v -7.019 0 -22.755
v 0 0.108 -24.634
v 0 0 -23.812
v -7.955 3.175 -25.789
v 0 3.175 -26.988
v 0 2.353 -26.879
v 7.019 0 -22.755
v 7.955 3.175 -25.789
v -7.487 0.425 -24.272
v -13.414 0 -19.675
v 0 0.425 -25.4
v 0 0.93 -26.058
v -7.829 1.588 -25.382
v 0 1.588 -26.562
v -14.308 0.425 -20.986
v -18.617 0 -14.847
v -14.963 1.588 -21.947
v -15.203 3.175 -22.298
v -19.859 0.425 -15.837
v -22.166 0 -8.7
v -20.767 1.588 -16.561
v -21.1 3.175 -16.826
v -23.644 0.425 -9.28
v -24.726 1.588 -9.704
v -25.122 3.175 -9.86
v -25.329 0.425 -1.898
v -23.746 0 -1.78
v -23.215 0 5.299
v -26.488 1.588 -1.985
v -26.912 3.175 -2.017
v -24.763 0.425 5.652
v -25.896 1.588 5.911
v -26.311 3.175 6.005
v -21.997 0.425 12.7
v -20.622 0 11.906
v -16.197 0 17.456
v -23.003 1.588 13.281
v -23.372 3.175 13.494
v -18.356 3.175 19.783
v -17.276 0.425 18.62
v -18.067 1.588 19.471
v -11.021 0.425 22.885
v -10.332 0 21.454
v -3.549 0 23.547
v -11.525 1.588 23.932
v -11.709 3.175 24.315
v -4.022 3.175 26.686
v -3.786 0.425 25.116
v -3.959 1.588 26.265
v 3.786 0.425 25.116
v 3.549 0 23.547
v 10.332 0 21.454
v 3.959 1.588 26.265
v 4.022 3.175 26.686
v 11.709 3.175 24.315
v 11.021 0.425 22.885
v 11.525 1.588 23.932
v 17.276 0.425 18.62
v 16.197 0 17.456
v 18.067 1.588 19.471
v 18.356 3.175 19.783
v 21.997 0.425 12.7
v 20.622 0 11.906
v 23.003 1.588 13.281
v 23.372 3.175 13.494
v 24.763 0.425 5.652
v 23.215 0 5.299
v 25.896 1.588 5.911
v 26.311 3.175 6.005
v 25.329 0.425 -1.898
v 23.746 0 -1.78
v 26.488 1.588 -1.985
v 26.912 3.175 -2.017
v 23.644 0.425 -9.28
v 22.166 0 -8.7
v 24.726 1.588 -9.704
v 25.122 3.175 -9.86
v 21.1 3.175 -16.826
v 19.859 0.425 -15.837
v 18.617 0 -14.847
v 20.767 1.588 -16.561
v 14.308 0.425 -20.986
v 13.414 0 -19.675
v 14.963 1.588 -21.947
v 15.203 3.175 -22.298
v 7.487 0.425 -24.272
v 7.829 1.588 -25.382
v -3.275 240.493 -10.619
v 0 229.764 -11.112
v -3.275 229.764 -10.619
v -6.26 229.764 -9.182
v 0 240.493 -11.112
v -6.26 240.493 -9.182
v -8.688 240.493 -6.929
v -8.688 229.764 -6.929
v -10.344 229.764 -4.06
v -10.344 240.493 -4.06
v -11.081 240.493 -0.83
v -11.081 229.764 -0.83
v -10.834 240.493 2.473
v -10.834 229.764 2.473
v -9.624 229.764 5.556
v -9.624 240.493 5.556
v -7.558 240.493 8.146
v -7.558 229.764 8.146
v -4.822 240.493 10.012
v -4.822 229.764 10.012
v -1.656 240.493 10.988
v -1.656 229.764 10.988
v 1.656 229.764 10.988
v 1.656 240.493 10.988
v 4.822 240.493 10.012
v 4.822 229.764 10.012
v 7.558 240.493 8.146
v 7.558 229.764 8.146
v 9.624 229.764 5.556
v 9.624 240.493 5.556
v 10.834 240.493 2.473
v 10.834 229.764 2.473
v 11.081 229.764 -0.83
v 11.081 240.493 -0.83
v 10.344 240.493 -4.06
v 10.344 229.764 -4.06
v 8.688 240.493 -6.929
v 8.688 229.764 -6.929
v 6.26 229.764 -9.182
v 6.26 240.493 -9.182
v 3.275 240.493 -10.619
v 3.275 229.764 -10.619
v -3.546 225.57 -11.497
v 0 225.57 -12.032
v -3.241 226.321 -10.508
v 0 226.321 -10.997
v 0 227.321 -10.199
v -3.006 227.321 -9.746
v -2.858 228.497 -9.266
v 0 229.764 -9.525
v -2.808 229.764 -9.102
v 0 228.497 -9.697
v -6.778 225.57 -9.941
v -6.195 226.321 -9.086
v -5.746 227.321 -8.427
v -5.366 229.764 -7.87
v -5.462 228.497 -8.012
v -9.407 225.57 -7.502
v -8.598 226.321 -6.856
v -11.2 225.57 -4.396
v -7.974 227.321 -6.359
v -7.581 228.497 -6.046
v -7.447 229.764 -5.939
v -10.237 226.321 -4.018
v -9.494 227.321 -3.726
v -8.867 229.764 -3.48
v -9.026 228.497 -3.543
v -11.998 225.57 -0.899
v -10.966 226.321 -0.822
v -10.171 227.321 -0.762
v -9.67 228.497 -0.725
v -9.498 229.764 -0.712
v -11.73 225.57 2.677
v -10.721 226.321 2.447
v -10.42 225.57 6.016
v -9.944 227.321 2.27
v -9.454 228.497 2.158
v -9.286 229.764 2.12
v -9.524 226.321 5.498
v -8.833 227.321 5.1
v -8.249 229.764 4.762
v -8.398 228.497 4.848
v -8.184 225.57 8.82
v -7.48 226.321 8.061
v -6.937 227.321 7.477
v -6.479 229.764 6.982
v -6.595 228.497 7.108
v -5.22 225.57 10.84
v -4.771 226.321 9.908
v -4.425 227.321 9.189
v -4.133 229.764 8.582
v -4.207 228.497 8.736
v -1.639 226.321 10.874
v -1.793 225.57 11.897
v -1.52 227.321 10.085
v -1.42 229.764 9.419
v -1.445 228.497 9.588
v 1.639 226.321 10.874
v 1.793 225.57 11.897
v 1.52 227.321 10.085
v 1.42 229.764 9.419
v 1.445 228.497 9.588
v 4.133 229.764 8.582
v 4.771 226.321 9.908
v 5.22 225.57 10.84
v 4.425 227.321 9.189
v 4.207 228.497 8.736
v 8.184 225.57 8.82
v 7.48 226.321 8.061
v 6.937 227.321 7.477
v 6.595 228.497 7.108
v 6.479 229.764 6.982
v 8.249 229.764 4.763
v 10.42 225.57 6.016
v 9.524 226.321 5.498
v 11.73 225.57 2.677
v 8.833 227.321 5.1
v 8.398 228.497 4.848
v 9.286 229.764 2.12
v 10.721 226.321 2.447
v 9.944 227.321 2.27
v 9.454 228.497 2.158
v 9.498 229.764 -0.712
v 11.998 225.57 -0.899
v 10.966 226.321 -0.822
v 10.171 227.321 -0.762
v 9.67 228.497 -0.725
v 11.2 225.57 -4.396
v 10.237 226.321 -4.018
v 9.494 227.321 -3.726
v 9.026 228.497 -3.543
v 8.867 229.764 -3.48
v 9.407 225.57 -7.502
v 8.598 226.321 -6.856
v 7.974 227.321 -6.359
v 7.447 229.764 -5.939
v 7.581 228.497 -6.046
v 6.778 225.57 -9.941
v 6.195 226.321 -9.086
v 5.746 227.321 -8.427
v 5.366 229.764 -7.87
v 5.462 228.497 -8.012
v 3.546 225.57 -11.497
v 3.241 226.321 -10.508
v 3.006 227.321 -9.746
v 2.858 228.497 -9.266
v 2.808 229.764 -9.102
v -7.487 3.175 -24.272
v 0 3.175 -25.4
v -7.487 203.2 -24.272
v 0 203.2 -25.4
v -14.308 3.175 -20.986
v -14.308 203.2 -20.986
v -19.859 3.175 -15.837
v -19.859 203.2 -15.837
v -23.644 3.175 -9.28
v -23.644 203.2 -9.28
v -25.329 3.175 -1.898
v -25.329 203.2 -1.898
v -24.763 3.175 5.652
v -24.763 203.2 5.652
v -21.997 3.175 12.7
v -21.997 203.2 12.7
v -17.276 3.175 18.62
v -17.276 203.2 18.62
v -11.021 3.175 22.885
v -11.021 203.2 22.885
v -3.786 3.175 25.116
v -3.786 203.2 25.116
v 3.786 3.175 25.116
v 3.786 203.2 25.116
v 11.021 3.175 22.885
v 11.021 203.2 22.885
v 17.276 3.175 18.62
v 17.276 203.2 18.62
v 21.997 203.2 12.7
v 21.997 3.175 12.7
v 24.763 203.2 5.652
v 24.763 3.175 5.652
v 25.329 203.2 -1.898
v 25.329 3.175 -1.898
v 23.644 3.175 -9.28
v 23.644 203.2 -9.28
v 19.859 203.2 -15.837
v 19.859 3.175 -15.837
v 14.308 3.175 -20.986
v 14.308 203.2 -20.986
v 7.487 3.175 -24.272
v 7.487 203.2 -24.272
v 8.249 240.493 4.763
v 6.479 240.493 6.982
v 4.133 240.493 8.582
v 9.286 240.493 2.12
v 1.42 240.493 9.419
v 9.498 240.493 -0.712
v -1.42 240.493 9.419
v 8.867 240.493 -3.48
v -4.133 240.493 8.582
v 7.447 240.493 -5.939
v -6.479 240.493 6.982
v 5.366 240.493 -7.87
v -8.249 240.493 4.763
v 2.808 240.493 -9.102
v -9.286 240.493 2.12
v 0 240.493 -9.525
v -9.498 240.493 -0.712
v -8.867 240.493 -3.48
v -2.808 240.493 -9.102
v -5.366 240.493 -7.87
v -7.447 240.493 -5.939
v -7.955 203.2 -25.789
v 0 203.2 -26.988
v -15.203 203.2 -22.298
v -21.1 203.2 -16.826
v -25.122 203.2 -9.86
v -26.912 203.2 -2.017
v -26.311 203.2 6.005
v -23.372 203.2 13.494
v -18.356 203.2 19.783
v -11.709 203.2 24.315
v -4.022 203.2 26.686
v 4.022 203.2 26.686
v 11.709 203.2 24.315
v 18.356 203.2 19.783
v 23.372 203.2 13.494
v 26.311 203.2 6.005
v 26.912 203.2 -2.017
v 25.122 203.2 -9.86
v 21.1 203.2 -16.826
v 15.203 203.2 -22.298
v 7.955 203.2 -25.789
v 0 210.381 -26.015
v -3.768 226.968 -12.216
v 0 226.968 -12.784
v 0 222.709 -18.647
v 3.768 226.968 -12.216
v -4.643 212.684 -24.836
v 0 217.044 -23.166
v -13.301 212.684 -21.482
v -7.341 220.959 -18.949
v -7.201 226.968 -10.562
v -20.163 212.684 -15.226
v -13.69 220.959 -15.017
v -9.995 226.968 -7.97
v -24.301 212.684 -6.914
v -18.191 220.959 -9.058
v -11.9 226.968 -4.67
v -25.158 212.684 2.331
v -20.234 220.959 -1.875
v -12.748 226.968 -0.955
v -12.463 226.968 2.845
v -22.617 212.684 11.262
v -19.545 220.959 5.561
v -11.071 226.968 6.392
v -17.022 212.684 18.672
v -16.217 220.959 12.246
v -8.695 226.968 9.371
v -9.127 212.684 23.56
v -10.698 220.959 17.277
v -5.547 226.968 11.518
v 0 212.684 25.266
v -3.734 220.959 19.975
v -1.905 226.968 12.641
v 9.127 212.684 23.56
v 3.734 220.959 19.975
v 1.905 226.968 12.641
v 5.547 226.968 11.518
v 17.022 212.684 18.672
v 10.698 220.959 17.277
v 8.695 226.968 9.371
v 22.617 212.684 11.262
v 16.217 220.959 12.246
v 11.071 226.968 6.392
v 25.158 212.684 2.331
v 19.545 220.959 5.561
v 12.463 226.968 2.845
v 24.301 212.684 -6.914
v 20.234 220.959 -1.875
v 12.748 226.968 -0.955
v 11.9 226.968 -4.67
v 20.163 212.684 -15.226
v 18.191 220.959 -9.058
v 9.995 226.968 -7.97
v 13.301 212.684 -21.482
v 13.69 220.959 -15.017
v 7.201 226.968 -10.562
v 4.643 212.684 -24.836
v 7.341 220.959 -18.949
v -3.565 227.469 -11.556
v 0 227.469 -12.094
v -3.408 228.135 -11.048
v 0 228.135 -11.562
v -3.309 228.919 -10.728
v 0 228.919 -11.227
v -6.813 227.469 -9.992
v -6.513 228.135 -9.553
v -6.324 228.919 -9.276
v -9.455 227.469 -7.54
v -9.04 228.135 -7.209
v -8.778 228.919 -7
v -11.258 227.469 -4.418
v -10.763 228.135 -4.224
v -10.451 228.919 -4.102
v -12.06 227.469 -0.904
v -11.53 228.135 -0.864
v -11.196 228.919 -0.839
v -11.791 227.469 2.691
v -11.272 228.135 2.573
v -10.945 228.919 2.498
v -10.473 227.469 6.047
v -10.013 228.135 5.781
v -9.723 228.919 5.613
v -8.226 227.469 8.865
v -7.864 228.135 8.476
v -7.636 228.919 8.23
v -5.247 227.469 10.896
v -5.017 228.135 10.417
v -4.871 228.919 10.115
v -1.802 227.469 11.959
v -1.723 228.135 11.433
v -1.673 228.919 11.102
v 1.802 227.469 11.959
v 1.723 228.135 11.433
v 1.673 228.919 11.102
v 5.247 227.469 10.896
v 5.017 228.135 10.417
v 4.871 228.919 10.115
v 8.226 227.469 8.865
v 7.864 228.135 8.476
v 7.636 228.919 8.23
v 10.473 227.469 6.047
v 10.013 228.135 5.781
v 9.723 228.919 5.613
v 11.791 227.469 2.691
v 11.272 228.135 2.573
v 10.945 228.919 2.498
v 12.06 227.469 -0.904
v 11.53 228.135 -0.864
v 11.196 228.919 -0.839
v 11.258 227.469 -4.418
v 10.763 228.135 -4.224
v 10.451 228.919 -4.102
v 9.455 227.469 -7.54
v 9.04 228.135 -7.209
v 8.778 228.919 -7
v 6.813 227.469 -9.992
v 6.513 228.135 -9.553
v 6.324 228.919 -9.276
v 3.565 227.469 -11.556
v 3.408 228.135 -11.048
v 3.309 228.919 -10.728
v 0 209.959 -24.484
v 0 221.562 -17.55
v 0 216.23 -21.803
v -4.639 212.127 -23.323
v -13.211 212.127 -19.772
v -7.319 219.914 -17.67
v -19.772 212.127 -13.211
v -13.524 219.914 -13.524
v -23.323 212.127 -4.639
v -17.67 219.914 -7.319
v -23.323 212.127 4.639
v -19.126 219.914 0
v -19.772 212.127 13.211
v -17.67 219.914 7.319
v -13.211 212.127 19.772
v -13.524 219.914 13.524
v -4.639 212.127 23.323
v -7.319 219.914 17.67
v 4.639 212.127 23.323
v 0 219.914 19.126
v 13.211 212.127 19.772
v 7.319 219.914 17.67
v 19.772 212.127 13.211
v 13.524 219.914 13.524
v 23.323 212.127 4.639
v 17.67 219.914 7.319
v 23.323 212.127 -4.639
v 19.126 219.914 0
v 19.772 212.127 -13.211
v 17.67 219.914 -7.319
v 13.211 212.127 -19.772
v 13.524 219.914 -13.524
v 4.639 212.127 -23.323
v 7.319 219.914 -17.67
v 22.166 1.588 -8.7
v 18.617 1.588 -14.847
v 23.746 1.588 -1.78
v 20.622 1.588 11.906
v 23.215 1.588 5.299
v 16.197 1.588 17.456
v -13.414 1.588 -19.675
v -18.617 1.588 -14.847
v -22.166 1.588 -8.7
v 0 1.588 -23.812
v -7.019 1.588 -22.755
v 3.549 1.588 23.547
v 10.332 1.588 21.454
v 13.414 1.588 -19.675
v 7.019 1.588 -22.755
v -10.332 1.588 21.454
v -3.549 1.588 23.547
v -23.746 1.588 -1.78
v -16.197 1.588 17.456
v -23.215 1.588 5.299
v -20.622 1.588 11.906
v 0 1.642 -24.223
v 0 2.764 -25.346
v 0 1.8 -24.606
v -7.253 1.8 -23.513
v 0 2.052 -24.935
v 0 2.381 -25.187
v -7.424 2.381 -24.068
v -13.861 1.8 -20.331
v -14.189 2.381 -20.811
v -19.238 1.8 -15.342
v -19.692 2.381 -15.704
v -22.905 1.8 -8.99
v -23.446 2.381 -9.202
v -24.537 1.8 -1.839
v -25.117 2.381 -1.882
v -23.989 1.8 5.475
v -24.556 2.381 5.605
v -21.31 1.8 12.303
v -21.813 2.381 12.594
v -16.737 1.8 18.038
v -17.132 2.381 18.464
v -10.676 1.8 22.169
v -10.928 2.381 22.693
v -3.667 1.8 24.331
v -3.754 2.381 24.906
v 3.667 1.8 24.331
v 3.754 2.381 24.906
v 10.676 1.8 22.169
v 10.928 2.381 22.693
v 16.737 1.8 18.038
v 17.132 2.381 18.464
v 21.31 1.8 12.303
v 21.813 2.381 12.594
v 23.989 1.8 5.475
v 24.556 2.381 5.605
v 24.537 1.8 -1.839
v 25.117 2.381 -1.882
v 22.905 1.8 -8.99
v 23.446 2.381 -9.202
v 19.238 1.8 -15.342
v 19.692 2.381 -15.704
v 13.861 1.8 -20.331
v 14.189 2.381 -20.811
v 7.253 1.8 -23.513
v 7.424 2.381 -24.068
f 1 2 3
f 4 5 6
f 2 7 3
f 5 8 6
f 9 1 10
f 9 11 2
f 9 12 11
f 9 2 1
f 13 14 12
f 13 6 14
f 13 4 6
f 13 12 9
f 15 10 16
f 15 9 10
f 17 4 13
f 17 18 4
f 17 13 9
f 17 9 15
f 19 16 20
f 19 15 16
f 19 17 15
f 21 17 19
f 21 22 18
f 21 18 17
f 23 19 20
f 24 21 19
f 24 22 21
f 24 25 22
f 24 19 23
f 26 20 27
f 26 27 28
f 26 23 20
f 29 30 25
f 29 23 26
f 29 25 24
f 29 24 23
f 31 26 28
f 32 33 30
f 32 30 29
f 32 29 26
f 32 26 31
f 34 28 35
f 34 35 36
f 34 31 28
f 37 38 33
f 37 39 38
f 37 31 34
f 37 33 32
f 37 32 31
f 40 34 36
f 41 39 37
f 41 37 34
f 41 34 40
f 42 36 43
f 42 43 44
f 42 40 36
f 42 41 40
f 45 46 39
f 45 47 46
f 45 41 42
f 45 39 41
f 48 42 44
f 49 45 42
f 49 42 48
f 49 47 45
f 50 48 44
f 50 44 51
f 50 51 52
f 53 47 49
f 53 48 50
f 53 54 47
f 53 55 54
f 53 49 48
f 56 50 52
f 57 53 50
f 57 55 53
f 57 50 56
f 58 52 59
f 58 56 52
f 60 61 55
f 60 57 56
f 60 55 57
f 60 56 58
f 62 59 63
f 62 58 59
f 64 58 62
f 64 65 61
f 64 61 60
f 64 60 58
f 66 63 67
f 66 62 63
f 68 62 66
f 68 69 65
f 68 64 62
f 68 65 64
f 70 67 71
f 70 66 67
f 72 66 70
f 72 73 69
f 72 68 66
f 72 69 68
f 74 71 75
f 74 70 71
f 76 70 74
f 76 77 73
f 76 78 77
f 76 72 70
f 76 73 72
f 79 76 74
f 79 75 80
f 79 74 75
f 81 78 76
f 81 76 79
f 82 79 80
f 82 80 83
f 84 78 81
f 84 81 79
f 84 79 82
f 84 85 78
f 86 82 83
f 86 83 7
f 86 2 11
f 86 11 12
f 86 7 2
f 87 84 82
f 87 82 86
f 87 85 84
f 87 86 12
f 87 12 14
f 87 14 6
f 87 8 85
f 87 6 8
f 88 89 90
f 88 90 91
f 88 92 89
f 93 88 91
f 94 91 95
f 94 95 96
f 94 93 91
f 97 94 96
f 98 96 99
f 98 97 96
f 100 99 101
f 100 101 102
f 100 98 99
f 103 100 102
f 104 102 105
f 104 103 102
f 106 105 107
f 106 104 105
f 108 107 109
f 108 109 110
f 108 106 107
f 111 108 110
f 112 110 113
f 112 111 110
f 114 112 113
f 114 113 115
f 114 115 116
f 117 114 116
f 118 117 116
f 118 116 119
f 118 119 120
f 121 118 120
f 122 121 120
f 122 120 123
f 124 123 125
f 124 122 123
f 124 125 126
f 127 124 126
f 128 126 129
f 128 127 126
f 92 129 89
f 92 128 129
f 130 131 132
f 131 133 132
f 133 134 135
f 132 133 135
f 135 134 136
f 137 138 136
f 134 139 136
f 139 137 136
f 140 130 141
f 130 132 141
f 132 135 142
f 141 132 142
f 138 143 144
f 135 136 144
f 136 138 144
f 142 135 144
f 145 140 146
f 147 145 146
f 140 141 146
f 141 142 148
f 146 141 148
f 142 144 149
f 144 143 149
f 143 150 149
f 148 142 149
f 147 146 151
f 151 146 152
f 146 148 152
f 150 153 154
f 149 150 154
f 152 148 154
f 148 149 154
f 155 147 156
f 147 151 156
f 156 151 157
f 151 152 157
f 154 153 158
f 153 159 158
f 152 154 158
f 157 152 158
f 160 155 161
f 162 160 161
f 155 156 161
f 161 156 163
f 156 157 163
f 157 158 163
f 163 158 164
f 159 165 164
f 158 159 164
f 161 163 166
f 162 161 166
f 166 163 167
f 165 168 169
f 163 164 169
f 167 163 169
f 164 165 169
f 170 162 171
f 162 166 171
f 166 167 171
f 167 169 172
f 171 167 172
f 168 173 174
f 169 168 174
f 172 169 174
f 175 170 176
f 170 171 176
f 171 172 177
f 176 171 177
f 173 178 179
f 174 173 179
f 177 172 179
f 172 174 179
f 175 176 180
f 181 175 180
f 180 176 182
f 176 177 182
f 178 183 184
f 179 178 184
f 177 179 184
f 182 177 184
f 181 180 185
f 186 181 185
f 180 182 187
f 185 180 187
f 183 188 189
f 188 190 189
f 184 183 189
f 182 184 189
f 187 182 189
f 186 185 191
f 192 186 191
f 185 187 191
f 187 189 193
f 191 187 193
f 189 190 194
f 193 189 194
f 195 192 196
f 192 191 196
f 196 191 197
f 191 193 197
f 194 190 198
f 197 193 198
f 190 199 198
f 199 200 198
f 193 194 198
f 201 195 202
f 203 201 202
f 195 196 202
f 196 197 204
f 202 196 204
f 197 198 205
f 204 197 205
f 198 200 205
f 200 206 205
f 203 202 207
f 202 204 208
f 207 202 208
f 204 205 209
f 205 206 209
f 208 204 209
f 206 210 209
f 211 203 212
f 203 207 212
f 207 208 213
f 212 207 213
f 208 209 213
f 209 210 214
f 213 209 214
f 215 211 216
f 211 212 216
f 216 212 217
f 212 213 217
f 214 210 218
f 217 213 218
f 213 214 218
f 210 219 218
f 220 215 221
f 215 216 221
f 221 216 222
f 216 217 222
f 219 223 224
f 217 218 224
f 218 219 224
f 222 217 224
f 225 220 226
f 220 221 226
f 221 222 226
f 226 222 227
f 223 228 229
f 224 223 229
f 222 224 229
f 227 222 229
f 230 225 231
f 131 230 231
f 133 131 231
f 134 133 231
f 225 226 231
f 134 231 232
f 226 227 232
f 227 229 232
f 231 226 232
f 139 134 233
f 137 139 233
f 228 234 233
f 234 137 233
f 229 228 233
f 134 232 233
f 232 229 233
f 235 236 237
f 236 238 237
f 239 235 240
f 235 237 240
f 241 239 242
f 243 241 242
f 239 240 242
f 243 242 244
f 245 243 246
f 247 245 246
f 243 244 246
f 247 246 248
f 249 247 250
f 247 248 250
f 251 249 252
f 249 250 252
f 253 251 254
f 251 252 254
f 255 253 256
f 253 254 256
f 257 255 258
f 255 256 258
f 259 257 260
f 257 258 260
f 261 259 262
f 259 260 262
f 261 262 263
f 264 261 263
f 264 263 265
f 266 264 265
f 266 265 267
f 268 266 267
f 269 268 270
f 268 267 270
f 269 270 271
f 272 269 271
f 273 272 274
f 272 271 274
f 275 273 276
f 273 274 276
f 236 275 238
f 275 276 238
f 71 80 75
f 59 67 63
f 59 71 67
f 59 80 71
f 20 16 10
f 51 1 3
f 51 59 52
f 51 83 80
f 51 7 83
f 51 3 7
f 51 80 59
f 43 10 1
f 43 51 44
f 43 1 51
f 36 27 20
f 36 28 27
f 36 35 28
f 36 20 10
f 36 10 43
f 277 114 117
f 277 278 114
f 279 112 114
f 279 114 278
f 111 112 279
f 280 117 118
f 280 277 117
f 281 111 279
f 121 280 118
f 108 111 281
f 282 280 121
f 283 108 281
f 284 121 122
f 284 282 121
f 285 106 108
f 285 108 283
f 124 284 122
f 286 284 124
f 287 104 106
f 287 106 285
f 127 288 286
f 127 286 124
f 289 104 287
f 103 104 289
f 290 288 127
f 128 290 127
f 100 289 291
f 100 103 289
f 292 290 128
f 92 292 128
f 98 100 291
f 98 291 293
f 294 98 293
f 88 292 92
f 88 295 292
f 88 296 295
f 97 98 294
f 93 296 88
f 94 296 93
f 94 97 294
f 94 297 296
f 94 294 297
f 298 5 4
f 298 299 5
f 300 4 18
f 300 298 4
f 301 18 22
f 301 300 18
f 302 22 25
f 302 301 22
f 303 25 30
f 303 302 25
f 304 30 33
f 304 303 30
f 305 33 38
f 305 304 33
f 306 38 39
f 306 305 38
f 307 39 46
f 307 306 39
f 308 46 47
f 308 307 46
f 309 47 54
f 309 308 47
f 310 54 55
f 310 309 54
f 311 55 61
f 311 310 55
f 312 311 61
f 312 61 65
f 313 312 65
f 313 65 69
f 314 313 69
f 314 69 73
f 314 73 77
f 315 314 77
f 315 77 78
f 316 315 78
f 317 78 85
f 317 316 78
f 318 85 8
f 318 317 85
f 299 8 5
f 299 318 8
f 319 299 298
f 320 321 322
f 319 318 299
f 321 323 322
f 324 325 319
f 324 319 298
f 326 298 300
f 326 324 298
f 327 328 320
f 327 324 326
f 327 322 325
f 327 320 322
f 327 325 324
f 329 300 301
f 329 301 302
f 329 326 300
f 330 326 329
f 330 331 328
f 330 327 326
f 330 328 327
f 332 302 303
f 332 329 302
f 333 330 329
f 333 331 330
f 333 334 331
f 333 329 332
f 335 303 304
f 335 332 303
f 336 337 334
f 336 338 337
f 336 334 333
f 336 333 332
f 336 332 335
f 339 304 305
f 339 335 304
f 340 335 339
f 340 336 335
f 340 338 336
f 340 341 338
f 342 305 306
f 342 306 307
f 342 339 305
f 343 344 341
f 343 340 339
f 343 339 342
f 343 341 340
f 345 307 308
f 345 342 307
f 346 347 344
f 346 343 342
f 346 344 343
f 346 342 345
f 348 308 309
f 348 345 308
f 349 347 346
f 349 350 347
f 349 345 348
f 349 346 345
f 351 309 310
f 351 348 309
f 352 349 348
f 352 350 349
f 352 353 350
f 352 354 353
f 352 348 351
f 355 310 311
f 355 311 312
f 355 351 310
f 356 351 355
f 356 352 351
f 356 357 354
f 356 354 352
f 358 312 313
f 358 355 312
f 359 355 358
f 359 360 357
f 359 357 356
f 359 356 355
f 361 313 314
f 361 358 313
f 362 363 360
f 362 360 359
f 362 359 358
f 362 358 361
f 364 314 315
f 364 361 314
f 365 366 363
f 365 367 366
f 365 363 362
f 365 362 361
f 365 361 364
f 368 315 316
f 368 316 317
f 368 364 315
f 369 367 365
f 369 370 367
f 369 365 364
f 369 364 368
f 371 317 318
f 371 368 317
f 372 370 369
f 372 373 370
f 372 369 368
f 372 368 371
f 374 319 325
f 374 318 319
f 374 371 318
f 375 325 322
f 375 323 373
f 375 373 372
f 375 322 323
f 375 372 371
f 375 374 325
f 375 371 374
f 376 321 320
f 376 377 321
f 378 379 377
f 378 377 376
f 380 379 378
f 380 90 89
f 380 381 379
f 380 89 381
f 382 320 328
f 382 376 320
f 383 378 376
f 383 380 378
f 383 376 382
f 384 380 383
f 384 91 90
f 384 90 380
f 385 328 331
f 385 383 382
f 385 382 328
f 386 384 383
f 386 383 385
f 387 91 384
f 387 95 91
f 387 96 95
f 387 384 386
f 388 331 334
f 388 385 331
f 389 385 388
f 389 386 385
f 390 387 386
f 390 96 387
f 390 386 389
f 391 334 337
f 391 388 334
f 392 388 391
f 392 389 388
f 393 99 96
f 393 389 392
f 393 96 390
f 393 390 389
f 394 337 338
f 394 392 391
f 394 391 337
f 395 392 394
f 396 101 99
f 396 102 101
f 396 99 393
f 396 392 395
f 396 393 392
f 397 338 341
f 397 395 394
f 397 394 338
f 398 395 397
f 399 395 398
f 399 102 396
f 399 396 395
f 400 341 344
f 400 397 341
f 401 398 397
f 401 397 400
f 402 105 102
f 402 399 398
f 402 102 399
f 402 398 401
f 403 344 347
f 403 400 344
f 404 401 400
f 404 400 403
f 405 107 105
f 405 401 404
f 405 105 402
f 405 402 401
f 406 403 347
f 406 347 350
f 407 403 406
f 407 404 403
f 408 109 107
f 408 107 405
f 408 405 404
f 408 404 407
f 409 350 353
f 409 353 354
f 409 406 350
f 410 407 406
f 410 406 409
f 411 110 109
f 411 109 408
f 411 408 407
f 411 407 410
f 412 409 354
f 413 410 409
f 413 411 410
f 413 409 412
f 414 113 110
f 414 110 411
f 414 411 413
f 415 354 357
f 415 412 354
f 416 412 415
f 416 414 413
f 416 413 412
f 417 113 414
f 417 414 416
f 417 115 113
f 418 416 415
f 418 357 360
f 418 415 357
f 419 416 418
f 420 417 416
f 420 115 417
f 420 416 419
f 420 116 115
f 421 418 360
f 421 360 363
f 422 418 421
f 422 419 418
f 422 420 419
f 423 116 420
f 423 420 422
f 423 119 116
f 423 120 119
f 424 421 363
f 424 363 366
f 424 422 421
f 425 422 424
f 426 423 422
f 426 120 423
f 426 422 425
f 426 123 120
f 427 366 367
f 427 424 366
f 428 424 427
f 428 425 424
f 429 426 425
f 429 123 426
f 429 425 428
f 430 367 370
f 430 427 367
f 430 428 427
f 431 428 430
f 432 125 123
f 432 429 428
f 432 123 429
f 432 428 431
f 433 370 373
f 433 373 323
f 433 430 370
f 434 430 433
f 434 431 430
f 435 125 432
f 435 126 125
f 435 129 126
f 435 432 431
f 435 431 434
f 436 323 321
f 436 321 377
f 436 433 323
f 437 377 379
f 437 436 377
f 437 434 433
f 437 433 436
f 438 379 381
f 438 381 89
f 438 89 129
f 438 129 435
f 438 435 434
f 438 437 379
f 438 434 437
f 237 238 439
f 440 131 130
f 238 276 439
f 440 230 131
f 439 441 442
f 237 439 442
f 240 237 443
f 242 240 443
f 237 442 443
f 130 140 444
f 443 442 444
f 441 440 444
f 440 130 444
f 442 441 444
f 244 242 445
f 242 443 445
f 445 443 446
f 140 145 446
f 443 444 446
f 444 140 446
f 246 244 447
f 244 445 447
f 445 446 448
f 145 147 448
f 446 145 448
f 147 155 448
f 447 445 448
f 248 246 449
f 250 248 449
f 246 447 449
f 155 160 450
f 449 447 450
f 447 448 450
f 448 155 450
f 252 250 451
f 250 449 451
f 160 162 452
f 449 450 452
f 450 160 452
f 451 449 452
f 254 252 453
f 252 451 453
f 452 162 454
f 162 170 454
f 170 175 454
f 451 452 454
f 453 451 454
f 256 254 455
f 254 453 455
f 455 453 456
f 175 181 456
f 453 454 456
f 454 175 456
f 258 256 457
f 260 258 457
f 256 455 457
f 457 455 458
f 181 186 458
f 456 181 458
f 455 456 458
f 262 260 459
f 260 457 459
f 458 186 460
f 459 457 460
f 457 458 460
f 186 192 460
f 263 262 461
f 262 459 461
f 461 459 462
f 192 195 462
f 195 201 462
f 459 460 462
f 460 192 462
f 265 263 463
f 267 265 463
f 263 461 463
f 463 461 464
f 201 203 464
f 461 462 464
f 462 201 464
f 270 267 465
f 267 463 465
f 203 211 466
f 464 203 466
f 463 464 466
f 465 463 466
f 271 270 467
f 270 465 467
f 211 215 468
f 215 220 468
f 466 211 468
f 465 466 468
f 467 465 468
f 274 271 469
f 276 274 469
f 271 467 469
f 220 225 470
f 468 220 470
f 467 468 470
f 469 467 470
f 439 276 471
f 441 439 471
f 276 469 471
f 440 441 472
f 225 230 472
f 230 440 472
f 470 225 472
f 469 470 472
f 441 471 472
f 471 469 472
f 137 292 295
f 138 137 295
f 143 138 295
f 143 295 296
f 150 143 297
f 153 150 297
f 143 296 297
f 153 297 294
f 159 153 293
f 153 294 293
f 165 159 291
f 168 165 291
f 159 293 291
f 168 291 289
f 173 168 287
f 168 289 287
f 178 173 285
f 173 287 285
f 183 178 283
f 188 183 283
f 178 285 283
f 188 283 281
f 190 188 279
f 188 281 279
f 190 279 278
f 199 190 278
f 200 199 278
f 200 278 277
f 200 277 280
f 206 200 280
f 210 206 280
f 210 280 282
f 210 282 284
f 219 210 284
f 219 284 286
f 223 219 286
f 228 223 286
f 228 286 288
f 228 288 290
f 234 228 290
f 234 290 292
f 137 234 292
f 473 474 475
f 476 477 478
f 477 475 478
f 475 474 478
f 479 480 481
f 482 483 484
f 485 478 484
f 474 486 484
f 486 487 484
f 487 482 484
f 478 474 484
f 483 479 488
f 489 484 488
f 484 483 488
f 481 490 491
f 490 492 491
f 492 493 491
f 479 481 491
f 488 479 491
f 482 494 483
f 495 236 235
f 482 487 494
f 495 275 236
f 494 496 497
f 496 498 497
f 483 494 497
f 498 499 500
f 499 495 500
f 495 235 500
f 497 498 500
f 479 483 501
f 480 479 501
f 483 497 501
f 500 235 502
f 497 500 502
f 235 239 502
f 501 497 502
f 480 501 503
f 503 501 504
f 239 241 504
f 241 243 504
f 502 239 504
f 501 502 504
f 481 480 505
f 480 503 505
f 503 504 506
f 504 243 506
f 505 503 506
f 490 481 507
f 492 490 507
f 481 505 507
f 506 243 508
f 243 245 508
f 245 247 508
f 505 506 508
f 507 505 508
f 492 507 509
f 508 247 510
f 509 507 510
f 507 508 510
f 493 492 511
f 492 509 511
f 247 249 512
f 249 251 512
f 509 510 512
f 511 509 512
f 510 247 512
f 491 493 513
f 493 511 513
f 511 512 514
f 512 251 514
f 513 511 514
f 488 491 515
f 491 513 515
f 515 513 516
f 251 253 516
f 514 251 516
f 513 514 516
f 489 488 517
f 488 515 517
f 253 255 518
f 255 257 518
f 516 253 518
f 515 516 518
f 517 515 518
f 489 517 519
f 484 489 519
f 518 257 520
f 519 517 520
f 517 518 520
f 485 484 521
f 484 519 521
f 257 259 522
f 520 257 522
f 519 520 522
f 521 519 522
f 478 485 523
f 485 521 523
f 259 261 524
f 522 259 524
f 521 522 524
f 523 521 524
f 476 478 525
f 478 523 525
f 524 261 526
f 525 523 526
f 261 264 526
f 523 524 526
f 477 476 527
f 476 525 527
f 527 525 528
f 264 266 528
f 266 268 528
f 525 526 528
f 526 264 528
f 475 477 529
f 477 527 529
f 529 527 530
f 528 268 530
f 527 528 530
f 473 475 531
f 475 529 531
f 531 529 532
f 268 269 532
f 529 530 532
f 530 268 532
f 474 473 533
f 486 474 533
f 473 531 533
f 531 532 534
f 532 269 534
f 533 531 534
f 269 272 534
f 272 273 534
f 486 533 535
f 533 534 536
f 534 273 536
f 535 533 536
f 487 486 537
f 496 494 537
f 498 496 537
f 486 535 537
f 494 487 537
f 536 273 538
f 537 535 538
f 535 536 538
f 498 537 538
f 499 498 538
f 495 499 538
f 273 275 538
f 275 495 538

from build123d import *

# Parameters (mm, degrees)
SHELL2_T = -1.5875


with BuildPart() as part:
    # Sketch4 → Revolve2 (revolve)
    with BuildSketch(Plane(origin=(0, 0, 0), x_dir=(0, 0, -1), z_dir=(1, 0, 0))):
        with BuildLine():
            Line((0, 0), (23.8125, 0))
            ThreePointArc((23.8125, 0), (26.05756403, 0.92993597), (26.9875, 3.175))
            Line((26.9875, 3.175), (26.9875, 203.2))
            ThreePointArc((26.9875, 203.2), (23.165937094, 217.044295388), (12.783552632, 226.967749964))
            ThreePointArc((12.783552632, 226.967749964), (11.562095636, 228.135215209), (11.1125, 229.763955842))
            Line((11.1125, 229.763955842), (11.1125, 240.493444248))
            Line((11.1125, 240.493444248), (0, 240.493444248))
            Line((0, 240.493444248), (0, 0))
        make_face()
    revolve(axis=Axis((0, 0, 0), (0, 1, 0)))

    # Shell2
    shell2_openings = [part.faces().sort_by_distance(p)[0] for p in [
        (0, 240.493444248, 0),
    ]]
    offset(amount=SHELL2_T, openings=shell2_openings, kind=Kind.INTERSECTION)


solid = part.part
